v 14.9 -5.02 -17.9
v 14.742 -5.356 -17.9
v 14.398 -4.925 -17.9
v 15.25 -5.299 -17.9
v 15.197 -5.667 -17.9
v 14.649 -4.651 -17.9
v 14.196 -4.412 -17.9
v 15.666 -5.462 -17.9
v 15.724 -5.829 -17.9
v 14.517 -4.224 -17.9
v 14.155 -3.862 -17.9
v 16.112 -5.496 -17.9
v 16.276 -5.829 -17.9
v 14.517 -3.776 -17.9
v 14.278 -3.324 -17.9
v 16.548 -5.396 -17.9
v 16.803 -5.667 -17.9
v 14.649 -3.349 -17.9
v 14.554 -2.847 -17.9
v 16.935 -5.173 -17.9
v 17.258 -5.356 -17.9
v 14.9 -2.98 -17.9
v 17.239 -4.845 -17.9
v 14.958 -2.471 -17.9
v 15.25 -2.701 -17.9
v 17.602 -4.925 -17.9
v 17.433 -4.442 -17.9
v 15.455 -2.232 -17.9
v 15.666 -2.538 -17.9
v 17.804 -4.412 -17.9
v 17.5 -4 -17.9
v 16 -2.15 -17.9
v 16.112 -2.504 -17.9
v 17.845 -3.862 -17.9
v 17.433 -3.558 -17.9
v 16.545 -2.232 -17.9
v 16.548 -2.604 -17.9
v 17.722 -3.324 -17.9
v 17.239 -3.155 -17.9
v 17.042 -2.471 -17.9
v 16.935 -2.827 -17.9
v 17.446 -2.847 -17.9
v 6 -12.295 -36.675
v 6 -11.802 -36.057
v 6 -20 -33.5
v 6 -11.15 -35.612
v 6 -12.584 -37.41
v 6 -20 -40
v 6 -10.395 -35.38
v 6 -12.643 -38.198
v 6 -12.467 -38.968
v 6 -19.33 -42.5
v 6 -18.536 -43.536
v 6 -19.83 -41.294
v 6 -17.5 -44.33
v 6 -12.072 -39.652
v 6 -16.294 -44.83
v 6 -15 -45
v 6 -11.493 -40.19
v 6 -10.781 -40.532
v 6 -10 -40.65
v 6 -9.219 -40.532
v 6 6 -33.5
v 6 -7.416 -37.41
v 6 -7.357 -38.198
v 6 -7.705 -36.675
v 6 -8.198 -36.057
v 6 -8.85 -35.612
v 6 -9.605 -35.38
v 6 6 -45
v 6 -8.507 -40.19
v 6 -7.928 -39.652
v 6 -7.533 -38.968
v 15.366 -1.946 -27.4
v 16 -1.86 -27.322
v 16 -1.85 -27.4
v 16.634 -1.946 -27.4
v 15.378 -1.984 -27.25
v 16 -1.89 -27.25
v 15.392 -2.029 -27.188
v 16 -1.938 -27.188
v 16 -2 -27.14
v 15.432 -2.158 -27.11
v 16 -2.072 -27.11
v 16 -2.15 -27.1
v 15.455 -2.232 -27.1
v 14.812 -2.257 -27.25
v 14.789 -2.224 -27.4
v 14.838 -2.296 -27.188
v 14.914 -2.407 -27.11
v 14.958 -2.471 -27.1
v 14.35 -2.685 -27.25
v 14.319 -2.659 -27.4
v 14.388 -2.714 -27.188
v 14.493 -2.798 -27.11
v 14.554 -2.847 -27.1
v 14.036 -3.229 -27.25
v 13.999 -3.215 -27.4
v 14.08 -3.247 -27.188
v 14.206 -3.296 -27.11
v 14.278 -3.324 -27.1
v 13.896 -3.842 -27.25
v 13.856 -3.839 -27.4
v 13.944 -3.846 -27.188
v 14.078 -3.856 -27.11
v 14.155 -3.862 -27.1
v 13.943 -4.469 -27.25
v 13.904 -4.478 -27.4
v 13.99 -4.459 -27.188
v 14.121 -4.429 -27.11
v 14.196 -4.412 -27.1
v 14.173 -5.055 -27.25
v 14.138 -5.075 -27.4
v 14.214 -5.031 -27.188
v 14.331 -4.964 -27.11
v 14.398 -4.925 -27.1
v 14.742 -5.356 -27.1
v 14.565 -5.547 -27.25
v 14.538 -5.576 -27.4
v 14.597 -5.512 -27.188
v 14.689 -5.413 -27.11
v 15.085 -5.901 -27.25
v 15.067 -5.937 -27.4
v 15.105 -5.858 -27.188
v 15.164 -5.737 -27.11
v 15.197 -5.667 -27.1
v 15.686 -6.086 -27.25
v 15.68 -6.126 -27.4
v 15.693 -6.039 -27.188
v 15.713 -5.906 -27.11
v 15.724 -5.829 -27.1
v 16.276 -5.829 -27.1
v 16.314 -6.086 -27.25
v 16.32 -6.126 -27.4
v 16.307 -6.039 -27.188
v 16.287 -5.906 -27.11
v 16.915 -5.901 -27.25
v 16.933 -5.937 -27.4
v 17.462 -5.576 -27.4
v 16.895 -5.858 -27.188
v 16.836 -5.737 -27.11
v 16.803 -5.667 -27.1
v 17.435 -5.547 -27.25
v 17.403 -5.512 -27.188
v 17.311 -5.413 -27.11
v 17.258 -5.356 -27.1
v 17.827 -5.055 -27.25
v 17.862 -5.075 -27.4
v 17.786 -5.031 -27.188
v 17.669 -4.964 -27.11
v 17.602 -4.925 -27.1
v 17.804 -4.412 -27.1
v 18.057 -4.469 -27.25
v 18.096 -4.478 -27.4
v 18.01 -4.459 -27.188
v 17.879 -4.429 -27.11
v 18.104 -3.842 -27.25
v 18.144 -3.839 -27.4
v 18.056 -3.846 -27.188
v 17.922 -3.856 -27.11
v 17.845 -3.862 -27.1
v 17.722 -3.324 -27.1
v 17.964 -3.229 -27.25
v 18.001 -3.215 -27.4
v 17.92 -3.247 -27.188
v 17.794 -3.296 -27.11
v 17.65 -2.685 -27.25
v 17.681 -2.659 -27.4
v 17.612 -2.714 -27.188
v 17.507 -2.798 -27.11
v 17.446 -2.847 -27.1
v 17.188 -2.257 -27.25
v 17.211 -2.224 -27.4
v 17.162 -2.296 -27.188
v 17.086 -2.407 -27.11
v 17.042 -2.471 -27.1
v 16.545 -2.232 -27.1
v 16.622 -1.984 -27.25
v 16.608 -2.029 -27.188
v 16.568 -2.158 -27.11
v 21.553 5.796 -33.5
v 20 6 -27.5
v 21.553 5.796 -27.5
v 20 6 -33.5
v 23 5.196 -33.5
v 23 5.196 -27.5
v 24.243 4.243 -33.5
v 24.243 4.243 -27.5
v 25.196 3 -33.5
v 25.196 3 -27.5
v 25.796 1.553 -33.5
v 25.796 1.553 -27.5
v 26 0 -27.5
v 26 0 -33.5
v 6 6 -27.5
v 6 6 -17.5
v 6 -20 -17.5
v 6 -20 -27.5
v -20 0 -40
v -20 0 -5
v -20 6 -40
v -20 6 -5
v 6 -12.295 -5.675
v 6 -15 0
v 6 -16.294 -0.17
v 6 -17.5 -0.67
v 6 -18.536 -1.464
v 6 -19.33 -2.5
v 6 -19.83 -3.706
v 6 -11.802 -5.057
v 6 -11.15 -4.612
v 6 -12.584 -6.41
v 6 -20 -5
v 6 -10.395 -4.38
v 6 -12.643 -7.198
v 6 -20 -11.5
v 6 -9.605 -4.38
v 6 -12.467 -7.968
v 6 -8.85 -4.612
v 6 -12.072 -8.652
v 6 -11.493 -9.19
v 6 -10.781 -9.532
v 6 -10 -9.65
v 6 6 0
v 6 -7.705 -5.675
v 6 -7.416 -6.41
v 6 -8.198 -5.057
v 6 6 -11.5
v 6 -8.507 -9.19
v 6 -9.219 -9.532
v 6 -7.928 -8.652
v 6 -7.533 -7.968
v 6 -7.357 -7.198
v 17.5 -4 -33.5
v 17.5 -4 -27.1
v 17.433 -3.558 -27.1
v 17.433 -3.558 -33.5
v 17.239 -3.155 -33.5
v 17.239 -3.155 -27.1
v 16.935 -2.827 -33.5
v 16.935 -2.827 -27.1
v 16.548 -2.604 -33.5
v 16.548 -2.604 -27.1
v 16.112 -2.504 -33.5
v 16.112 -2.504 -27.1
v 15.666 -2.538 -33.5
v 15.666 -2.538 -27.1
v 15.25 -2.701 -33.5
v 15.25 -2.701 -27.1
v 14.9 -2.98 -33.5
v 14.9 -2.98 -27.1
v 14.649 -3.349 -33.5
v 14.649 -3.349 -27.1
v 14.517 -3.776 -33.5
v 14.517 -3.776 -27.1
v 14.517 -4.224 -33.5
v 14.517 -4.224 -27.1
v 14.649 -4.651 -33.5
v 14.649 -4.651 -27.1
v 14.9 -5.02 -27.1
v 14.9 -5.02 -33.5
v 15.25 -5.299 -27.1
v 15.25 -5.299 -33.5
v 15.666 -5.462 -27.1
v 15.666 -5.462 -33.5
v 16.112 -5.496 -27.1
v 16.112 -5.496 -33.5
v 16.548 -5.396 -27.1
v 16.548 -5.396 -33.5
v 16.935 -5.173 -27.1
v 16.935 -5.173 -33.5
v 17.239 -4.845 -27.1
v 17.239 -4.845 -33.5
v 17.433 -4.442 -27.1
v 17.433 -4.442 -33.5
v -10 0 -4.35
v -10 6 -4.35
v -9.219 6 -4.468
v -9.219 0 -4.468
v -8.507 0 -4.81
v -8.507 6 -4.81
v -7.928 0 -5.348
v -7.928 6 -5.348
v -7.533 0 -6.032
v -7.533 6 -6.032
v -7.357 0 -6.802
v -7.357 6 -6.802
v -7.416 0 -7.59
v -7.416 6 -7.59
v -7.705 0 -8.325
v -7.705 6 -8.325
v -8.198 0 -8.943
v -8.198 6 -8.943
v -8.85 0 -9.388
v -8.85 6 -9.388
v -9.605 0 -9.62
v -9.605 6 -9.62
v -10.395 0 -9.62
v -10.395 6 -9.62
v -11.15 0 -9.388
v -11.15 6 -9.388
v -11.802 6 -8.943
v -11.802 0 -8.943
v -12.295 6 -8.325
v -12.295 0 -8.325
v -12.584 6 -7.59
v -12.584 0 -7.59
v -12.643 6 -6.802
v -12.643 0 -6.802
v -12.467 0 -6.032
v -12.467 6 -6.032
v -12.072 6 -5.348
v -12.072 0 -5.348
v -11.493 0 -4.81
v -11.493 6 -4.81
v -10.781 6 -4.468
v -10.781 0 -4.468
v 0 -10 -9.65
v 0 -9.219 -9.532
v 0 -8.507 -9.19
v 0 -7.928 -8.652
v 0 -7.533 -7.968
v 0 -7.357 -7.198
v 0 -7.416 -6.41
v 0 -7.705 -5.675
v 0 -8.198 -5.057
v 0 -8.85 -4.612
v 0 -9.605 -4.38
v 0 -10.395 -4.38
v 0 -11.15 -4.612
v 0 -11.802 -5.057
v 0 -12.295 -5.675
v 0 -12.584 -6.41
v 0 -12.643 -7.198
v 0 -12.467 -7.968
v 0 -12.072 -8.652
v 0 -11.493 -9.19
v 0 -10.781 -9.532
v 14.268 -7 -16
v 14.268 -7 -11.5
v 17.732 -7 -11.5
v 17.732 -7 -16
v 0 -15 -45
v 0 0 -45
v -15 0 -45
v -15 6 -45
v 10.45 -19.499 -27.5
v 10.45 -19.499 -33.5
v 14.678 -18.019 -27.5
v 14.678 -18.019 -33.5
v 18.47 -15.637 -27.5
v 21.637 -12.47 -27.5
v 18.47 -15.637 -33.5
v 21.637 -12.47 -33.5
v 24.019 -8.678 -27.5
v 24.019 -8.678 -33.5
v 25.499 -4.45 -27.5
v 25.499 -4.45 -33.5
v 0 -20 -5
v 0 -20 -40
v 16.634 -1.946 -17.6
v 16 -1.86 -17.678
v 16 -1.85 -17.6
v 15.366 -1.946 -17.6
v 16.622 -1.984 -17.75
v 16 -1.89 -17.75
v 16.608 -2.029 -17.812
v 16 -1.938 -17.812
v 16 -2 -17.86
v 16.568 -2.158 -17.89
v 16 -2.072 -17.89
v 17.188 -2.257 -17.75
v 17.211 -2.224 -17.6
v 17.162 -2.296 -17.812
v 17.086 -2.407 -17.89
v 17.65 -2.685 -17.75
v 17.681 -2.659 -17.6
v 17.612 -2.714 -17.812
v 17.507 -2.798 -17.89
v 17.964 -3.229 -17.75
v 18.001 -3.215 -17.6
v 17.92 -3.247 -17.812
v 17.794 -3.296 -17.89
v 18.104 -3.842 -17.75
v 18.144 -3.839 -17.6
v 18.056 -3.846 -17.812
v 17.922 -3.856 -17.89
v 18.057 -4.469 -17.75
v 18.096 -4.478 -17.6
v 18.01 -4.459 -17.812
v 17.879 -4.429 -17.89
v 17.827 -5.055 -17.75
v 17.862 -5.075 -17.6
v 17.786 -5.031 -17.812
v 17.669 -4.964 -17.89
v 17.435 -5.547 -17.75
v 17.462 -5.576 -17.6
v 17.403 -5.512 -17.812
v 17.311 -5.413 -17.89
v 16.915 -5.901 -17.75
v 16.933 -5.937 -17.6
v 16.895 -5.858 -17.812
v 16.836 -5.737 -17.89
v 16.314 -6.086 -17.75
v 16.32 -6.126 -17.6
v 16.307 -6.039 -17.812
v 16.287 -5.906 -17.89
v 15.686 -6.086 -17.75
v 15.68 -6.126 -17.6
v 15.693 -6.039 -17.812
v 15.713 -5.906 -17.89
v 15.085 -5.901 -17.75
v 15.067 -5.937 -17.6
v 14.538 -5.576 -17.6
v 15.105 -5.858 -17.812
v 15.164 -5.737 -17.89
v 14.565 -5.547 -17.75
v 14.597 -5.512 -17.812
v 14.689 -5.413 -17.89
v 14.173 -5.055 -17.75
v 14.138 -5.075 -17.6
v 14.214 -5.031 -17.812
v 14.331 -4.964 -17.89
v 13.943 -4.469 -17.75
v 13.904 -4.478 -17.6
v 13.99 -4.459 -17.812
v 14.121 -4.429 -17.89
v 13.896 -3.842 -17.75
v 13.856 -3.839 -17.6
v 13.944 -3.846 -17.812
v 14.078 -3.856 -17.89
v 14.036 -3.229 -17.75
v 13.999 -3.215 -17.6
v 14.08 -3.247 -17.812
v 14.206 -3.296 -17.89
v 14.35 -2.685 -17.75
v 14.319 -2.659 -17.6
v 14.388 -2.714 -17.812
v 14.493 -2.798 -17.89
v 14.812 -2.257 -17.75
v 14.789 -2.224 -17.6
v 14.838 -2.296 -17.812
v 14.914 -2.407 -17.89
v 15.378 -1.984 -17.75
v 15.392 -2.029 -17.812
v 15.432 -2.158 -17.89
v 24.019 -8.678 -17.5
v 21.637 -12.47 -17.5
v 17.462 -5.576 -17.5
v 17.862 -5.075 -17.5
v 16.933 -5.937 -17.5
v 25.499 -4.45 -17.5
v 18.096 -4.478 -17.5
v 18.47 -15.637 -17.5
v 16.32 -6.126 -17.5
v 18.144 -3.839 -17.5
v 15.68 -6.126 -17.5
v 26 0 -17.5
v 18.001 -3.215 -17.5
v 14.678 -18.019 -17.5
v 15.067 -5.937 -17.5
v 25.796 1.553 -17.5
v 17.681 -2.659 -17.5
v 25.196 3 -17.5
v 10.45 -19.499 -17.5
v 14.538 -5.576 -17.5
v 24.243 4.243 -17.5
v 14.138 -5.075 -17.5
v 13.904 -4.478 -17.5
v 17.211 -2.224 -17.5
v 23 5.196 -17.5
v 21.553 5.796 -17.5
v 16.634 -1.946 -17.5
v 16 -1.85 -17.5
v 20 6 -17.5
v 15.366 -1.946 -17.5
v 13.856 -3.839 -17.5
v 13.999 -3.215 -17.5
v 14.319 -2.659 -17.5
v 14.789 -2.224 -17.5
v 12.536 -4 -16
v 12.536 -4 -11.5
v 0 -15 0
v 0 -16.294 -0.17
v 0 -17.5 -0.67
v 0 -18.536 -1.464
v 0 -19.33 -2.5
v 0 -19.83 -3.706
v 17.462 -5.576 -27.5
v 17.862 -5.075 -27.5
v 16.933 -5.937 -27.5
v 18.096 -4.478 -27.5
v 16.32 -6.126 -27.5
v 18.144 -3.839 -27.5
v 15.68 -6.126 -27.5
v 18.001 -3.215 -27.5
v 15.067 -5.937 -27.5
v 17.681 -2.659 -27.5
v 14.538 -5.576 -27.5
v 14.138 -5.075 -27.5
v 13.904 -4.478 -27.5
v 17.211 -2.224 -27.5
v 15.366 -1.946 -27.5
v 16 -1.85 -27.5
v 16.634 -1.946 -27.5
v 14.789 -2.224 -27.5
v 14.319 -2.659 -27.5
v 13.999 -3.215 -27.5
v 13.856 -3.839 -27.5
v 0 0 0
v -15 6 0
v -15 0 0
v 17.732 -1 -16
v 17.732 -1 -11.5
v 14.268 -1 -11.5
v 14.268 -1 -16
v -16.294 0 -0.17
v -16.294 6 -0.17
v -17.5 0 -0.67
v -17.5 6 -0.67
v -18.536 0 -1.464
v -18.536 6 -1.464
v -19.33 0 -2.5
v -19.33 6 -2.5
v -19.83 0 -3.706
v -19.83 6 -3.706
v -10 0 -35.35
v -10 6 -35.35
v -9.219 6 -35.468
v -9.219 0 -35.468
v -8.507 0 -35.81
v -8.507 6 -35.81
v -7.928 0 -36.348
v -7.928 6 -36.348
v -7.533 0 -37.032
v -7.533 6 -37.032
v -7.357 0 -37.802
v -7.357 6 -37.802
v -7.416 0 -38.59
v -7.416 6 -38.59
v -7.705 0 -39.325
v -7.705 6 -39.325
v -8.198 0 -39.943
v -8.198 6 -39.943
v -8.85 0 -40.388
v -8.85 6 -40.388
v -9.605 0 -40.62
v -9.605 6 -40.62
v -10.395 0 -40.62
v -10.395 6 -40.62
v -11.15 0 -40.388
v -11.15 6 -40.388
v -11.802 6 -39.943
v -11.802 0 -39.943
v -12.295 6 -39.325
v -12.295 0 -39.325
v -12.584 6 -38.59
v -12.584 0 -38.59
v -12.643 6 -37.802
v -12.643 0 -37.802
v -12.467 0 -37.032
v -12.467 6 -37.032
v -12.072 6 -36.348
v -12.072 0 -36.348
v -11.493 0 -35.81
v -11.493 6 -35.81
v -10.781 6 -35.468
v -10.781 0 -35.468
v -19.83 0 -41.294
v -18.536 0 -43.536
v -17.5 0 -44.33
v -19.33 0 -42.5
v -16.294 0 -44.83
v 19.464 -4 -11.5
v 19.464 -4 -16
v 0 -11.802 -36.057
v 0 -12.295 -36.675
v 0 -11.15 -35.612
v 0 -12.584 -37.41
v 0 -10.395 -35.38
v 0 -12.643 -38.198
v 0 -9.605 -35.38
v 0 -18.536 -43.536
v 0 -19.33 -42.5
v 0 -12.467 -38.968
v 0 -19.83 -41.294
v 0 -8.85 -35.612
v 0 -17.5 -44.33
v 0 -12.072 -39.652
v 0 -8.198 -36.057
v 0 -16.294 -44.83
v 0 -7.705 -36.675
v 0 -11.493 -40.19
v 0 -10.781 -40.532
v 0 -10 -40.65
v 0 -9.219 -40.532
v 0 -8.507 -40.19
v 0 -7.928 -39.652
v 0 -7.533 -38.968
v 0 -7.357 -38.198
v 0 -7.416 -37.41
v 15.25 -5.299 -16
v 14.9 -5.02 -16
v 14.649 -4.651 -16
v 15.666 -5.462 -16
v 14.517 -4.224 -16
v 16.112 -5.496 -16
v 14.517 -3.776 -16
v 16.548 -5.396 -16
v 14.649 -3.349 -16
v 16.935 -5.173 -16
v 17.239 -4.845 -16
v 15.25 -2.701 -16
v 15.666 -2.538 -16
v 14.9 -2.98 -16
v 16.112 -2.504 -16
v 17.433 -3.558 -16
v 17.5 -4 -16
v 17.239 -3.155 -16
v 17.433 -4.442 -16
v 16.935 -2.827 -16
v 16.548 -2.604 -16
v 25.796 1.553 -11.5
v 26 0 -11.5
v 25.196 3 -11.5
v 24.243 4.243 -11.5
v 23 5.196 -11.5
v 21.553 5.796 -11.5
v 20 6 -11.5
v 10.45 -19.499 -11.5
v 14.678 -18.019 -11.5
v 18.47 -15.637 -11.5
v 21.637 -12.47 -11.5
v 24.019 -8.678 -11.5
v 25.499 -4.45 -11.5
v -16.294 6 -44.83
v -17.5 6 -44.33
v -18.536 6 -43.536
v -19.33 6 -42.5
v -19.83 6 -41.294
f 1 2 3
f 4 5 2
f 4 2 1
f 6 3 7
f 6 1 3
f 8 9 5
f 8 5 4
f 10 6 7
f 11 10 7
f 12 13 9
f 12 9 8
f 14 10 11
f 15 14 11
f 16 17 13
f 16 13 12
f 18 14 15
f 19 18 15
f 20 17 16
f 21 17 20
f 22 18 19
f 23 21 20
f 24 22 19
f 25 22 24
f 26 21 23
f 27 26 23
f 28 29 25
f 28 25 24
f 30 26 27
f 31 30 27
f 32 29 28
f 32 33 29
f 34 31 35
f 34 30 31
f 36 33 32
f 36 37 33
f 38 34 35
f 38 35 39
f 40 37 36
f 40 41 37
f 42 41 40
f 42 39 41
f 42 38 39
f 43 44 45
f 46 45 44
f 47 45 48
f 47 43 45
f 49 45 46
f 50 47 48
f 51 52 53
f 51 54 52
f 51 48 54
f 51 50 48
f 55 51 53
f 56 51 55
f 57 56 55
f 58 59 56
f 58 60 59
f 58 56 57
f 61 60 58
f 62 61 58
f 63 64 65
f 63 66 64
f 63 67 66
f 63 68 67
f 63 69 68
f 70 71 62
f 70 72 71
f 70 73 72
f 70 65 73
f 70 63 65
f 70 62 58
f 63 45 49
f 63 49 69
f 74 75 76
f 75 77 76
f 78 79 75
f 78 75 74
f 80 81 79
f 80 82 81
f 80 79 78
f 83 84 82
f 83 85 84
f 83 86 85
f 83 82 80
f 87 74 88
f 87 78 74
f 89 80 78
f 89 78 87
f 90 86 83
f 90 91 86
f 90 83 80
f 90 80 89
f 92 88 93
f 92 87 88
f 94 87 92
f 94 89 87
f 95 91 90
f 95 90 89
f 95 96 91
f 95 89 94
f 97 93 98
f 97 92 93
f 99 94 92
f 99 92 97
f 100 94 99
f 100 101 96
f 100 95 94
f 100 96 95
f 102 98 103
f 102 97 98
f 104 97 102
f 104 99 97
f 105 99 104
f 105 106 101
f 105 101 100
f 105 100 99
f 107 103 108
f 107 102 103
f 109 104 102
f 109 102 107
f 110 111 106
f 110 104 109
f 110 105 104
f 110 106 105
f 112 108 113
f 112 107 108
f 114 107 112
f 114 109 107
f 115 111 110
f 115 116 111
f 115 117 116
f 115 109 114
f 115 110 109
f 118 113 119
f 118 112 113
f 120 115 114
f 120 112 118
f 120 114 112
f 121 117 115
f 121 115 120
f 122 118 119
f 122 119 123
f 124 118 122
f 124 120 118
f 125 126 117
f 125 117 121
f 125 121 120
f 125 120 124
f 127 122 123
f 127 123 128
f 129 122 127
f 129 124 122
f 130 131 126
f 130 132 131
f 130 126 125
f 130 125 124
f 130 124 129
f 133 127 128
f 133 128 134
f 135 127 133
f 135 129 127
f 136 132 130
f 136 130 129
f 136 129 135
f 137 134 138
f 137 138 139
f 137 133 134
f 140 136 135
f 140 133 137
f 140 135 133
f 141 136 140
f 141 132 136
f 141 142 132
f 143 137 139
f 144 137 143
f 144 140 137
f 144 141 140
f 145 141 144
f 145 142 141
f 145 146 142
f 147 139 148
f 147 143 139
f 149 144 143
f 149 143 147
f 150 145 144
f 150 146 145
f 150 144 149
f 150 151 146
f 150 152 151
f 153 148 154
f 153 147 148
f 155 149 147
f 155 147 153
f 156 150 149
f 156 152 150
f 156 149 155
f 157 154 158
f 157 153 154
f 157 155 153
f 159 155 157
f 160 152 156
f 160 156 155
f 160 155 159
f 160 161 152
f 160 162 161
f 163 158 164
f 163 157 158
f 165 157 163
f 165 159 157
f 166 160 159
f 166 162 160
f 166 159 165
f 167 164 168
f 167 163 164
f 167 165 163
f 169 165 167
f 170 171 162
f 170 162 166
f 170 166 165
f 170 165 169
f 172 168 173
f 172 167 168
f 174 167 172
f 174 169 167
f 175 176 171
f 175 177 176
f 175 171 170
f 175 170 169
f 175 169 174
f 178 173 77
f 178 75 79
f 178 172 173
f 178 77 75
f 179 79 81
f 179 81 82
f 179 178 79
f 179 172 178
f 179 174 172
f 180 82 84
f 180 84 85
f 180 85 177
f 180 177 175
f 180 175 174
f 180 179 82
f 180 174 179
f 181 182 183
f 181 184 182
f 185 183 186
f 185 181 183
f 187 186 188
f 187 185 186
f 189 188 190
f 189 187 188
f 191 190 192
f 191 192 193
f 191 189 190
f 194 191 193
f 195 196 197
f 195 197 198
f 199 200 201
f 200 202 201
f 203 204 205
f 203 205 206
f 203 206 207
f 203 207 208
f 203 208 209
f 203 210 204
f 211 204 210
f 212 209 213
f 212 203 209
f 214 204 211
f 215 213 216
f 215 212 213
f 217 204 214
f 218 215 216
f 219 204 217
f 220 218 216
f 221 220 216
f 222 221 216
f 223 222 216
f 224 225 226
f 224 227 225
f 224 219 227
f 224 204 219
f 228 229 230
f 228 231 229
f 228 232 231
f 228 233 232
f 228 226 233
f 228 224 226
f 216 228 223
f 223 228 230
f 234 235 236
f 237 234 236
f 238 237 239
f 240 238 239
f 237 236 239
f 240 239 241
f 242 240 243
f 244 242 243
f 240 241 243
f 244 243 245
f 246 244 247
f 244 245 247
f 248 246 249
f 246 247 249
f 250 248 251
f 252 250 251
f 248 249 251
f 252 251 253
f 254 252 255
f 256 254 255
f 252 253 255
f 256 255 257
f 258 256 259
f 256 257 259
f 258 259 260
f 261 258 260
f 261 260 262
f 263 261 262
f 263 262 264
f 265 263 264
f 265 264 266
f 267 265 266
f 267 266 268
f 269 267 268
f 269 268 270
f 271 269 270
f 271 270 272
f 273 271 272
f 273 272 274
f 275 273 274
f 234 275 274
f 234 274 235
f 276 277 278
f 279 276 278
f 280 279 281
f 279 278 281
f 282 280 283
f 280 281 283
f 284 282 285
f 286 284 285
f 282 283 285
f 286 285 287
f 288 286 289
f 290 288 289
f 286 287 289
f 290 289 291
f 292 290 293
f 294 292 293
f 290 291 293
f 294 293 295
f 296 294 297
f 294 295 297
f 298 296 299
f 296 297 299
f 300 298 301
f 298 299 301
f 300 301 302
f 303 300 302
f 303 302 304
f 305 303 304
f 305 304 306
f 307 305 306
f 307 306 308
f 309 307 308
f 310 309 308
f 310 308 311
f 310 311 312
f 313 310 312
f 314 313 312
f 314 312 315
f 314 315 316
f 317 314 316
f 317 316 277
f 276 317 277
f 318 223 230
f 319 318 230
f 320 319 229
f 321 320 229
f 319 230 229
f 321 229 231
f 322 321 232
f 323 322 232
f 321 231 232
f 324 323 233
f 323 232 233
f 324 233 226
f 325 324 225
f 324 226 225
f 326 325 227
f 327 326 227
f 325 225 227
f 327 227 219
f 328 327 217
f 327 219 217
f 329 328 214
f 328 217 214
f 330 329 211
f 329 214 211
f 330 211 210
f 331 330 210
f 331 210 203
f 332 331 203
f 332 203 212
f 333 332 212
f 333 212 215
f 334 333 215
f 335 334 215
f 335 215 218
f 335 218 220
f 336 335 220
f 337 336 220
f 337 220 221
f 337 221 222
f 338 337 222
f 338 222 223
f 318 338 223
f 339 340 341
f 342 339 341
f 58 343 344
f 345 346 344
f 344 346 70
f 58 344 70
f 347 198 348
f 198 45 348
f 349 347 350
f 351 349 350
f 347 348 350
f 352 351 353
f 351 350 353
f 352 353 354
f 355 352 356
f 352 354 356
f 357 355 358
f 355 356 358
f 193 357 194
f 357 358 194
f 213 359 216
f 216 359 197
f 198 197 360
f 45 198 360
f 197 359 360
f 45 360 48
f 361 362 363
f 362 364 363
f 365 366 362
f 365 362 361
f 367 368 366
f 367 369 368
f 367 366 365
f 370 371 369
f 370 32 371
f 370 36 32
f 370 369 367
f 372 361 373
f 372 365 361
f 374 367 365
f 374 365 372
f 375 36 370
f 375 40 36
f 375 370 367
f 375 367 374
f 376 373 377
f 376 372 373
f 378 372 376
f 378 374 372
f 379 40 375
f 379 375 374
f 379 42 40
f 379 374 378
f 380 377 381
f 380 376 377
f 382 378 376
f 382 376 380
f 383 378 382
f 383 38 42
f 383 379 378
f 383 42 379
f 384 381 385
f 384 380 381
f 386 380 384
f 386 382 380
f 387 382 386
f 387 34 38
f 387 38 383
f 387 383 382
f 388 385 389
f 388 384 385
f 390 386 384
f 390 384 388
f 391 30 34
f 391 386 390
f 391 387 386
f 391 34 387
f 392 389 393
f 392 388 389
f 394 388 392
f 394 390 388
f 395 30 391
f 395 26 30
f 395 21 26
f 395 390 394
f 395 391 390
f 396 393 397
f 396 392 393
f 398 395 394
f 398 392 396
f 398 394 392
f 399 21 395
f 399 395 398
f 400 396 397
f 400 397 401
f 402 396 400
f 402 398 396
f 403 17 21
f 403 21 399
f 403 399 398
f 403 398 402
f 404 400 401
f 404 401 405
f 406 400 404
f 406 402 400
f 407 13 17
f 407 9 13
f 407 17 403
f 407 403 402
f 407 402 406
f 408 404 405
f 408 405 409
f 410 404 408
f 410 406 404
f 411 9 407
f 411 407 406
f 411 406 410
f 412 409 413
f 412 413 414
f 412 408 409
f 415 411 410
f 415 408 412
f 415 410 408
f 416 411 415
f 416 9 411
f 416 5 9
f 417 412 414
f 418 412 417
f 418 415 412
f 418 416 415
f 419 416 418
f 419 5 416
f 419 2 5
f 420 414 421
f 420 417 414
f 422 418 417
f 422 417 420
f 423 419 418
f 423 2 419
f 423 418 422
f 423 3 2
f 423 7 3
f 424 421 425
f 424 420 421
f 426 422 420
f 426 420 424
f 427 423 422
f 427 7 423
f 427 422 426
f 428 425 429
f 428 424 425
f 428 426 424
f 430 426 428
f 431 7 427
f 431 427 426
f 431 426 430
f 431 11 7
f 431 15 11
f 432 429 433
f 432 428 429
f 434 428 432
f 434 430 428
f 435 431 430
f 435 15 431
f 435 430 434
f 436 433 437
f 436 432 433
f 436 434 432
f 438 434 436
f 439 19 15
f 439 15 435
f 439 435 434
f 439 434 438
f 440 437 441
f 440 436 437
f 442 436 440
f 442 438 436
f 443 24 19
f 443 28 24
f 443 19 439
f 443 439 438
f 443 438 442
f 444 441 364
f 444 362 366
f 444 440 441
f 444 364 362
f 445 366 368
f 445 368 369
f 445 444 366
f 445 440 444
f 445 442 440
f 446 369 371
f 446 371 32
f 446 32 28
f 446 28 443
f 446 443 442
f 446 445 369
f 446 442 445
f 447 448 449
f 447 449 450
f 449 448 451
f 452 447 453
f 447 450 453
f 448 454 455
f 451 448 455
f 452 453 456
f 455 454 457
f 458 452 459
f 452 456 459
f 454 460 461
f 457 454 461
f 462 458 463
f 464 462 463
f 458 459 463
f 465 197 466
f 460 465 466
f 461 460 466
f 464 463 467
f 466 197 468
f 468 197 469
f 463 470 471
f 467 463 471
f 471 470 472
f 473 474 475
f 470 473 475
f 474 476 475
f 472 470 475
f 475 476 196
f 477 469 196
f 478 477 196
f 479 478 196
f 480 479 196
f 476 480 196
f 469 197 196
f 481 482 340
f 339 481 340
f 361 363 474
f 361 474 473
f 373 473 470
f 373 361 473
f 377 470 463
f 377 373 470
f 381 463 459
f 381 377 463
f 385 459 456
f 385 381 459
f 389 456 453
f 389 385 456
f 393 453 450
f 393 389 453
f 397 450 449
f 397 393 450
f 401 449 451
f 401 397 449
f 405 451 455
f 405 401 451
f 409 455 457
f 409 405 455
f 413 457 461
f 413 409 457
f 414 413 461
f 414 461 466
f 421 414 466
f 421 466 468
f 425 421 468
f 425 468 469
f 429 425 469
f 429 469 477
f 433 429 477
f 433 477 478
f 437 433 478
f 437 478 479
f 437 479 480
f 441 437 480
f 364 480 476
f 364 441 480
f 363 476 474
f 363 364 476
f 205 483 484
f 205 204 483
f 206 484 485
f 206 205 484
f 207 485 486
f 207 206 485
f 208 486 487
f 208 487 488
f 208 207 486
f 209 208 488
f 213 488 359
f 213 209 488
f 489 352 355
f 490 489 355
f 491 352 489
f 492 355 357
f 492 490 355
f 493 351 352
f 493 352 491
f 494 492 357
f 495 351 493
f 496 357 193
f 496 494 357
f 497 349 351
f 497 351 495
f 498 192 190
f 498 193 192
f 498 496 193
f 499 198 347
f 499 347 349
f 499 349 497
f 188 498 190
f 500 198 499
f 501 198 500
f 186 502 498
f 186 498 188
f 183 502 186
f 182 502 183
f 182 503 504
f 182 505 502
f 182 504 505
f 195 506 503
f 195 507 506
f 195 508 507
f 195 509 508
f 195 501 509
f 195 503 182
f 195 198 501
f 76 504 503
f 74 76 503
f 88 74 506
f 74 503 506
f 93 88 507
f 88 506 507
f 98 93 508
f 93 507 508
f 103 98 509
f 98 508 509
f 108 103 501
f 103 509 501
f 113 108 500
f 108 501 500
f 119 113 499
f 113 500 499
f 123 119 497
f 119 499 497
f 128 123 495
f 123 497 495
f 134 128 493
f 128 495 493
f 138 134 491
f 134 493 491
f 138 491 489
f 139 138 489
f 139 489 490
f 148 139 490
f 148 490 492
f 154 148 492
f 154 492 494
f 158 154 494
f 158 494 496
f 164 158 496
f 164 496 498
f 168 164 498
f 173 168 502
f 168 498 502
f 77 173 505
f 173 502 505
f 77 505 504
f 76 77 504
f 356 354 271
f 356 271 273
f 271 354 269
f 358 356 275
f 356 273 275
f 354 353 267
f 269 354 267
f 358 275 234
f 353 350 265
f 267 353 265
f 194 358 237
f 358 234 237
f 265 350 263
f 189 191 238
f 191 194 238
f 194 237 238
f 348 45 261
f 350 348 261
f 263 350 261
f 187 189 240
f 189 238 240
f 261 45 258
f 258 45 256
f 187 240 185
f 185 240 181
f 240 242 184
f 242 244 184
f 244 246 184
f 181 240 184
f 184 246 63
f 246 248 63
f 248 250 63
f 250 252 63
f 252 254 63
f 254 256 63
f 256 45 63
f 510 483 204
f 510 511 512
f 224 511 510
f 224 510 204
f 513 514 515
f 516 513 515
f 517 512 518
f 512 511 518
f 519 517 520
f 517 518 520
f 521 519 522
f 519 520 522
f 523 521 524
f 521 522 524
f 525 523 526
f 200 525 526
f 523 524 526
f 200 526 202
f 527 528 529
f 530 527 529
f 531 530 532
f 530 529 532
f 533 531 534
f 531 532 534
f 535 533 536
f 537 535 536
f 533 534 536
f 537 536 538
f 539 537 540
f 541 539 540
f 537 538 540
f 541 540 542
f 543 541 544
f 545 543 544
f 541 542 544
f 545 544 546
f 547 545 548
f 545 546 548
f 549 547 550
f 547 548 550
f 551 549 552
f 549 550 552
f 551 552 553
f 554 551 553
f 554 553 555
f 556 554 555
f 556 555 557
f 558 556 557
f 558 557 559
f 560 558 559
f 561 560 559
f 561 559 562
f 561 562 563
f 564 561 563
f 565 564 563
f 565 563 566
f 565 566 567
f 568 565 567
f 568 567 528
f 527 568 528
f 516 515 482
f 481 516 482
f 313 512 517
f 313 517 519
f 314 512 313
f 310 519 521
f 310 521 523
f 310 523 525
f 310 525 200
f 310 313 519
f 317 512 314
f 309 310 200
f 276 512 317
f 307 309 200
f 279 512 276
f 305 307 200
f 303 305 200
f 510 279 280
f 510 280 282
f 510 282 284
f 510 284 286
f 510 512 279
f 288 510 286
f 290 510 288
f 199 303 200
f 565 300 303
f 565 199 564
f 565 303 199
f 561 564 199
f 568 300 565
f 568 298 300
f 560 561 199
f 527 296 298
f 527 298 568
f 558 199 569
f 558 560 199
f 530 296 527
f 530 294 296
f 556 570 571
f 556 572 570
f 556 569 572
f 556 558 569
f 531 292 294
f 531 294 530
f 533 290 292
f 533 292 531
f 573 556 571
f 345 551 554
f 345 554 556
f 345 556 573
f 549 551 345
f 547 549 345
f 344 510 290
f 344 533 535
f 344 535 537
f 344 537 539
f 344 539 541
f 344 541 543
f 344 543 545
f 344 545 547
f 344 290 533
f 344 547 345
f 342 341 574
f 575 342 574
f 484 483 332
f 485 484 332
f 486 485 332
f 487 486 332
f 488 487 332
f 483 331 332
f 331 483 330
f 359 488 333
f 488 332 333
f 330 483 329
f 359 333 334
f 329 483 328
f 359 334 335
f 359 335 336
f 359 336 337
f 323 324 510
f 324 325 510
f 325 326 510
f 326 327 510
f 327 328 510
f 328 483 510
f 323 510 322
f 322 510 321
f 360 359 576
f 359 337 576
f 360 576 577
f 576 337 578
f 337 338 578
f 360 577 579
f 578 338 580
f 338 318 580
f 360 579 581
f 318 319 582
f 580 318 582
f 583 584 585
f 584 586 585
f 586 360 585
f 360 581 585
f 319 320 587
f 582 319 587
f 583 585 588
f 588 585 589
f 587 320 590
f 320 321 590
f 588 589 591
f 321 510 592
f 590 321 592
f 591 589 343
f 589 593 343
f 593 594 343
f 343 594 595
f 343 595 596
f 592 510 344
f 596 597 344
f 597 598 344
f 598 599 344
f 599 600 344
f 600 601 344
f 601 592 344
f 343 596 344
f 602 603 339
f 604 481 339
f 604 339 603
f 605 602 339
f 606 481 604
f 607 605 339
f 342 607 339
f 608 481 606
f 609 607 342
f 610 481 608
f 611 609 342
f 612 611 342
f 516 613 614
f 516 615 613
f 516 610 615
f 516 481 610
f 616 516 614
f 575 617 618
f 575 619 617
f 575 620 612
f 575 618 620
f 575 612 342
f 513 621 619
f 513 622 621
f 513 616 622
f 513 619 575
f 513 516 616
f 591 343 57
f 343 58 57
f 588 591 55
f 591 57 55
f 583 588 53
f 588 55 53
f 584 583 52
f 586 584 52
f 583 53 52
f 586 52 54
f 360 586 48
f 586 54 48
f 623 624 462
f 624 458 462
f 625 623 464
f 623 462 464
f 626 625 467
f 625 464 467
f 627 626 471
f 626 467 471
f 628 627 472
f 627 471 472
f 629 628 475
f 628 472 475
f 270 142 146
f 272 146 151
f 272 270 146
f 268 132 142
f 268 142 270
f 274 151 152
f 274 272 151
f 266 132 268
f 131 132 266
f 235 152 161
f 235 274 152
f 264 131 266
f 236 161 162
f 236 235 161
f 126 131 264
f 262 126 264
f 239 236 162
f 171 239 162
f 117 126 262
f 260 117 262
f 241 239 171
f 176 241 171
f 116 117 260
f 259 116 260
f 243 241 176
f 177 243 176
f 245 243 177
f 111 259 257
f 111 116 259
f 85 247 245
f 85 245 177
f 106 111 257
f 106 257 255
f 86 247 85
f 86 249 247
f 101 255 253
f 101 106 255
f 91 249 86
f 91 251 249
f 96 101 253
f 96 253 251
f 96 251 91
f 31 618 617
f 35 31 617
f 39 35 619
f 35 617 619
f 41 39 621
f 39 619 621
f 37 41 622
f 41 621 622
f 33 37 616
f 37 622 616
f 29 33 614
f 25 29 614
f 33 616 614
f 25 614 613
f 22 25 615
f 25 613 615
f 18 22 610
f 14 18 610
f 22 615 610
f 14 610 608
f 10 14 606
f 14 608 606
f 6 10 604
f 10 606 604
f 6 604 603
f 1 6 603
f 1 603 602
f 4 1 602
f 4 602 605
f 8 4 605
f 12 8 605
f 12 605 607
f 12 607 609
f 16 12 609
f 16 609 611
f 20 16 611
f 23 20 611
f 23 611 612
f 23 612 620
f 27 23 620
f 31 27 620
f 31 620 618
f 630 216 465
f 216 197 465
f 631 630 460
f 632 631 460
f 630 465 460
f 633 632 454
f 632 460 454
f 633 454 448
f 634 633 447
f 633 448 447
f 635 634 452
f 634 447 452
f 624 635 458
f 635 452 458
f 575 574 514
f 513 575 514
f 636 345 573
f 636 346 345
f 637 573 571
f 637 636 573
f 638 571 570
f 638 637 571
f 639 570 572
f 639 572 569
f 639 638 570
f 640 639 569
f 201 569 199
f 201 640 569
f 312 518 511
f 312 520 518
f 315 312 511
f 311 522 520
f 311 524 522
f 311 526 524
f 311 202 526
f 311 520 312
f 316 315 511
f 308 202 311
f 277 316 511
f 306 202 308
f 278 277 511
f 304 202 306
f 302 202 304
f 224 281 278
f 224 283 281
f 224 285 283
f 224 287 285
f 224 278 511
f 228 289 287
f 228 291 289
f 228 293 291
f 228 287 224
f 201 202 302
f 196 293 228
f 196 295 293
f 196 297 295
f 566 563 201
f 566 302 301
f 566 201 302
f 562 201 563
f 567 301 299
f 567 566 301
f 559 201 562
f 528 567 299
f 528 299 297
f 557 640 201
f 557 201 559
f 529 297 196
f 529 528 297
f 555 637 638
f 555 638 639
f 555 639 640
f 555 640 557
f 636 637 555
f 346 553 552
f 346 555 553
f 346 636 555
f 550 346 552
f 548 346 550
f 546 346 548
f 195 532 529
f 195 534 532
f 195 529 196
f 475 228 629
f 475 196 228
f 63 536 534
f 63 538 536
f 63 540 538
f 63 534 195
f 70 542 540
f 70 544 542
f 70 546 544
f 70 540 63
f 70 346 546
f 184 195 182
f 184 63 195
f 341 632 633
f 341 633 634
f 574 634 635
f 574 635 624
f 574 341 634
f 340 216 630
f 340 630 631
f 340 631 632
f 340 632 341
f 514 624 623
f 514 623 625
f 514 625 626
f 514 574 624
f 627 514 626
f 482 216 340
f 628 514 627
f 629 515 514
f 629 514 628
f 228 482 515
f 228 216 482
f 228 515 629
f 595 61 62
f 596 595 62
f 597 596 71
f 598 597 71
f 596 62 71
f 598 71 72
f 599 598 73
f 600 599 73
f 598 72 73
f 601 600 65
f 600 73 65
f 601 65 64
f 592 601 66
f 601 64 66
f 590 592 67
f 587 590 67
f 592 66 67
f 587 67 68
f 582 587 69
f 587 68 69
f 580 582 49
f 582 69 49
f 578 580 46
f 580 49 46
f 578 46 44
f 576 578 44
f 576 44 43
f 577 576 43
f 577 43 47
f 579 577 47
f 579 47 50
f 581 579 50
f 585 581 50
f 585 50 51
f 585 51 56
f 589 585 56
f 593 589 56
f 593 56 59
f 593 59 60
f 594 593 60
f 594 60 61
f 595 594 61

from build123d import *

# Parameters (mm, degrees)
SKETCH1_W           = 45
SKETCH1_H           = 6
BOSS_EXTRUDE1_DEPTH = 20
SKETCH2_W           = 6
SKETCH2_H           = 45
BOSS_EXTRUDE2_DEPTH = 26
SKETCH3_R           = 2.65
CUT_EXTRUDE1_DEPTH  = 26
SKETCH4_R           = 2.65
CUT_EXTRUDE2_DEPTH  = 26
FILLET1_R           = 5
SKETCH5_W           = 6
SKETCH5_H           = 26
BOSS_EXTRUDE3_DEPTH = 20
SKETCH8_R           = 2.15
BOSS_EXTRUDE6_DEPTH = 0.4
BOSS_EXTRUDE5_START = 0.4
SKETCH7_R           = 2.15
BOSS_EXTRUDE5_DEPTH = 0.4
SKETCH6_R           = 1.5
CUT_EXTRUDE3_DEPTH  = 47.885498824
FILLET2_R           = 20
FILLET3_R           = 6
FILLET4_R           = 0.3
FILLET5_R           = 0.3
CUT_EXTRUDE4_DEPTH  = 4.5


with BuildPart() as part:
    # Sketch1 → Boss-Extrude1 (new body)
    with BuildSketch(Plane(origin=(0, 0, 0), x_dir=(0, 0, -1), z_dir=(1, 0, 0))):
        with Locations((22.5, 3)):
            Rectangle(SKETCH1_W, SKETCH1_H)
    extrude(amount=-BOSS_EXTRUDE1_DEPTH)

    # Sketch2 → Boss-Extrude2 (add)
    with BuildSketch(Plane(origin=(0, 6, 0), x_dir=(1, 0, 0), z_dir=(0, 1, 0))):
        with Locations((3, 22.5)):
            Rectangle(SKETCH2_W, SKETCH2_H)
    extrude(amount=-BOSS_EXTRUDE2_DEPTH)

    # Sketch3 → Cut-Extrude1 (cut)
    with BuildSketch(Plane(origin=(0, 6, 0), x_dir=(1, 0, 0), z_dir=(0, 1, 0))):
        with Locations(Location((-10, 7, 0), (0, 0, 270))):
            Circle(SKETCH3_R)
        with Locations(Location((-10, 38, 0), (0, 0, 270))):
            Circle(SKETCH3_R)
    extrude(amount=-CUT_EXTRUDE1_DEPTH, mode=Mode.SUBTRACT)

    # Sketch4 → Cut-Extrude2 (cut)
    with BuildSketch(Plane(origin=(6, 0, 0), x_dir=(0, 0, -1), z_dir=(1, 0, 0))):
        with Locations((7, -10)):
            Circle(SKETCH4_R)
        with Locations((38, -10)):
            Circle(SKETCH4_R)
    extrude(amount=-CUT_EXTRUDE2_DEPTH, mode=Mode.SUBTRACT)

    # Fillet1
    fillet1_edges = [part.edges().sort_by_distance(p)[0] for p in [
        (-20, 3, -45),
        (3, -20, -45),
        (3, -20, 0),
        (-20, 3, 0),
    ]]
    fillet(fillet1_edges, radius=FILLET1_R)

    # Sketch5 → Boss-Extrude3 (add)
    with BuildSketch(Plane(origin=(6, 0, 0), x_dir=(0, 0, -1), z_dir=(1, 0, 0))):
        with Locations((30.5, -7)):
            Rectangle(SKETCH5_W, SKETCH5_H)
        with Locations((14.5, -7)):
            Rectangle(SKETCH5_W, SKETCH5_H)
    extrude(amount=BOSS_EXTRUDE3_DEPTH)

    # Sketch8 → Boss-Extrude6 (add)
    with BuildSketch(Plane.XY.offset(-27.5)):
        with Locations(Location((16, -4, 0), (0, 0, 90))):
            Circle(SKETCH8_R)
    extrude(amount=BOSS_EXTRUDE6_DEPTH)

    # Sketch7 → Boss-Extrude5 (add)
    with BuildSketch(Plane(origin=(0, 0, -17.5), x_dir=(-1, 0, 0), z_dir=(0, 0, -1)).offset(BOSS_EXTRUDE5_START)):
        with Locations(Location((-16, -4, 0), (0, 0, 90))):
            Circle(SKETCH7_R)
    extrude(amount=-BOSS_EXTRUDE5_DEPTH)

    # Sketch6 → Cut-Extrude3 (cut, through all)
    with BuildSketch(Plane.XY.offset(-11.5)):
        with Locations((16, -4)):
            Circle(SKETCH6_R)
    extrude(amount=-CUT_EXTRUDE3_DEPTH, mode=Mode.SUBTRACT)

    # Fillet2
    fillet2_edges = [part.edges().sort_by_distance(p)[0] for p in [
        (26, -20, -14.5),
        (26, -20, -30.5),
    ]]
    fillet(fillet2_edges, radius=FILLET2_R)

    # Fillet3
    fillet3_edges = [part.edges().sort_by_distance(p)[0] for p in [
        (26, 6, -14.5),
        (26, 6, -30.5),
    ]]
    fillet(fillet3_edges, radius=FILLET3_R - 0.0001)  # a hair under: the kernel refuses the full size

    # Fillet4
    fillet4_edges = [part.edges().sort_by_distance(p)[0] for p in [
        (16, -6.15, -27.1),
    ]]
    fillet(fillet4_edges, radius=FILLET4_R)

    # Fillet5
    fillet5_edges = [part.edges().sort_by_distance(p)[0] for p in [
        (16, -6.15, -17.9),
    ]]
    fillet(fillet5_edges, radius=FILLET5_R)

    # Sketch9 → Cut-Extrude4 (cut)
    with BuildSketch(Plane.XY.offset(-11.5)):
        Polygon((14.267949192, -1), (12.535898385, -4), (14.267949192, -7), (17.732050808, -7), (19.464101615, -4), (17.732050808, -1), align=None)
    extrude(amount=-CUT_EXTRUDE4_DEPTH, mode=Mode.SUBTRACT)


solid = part.part
